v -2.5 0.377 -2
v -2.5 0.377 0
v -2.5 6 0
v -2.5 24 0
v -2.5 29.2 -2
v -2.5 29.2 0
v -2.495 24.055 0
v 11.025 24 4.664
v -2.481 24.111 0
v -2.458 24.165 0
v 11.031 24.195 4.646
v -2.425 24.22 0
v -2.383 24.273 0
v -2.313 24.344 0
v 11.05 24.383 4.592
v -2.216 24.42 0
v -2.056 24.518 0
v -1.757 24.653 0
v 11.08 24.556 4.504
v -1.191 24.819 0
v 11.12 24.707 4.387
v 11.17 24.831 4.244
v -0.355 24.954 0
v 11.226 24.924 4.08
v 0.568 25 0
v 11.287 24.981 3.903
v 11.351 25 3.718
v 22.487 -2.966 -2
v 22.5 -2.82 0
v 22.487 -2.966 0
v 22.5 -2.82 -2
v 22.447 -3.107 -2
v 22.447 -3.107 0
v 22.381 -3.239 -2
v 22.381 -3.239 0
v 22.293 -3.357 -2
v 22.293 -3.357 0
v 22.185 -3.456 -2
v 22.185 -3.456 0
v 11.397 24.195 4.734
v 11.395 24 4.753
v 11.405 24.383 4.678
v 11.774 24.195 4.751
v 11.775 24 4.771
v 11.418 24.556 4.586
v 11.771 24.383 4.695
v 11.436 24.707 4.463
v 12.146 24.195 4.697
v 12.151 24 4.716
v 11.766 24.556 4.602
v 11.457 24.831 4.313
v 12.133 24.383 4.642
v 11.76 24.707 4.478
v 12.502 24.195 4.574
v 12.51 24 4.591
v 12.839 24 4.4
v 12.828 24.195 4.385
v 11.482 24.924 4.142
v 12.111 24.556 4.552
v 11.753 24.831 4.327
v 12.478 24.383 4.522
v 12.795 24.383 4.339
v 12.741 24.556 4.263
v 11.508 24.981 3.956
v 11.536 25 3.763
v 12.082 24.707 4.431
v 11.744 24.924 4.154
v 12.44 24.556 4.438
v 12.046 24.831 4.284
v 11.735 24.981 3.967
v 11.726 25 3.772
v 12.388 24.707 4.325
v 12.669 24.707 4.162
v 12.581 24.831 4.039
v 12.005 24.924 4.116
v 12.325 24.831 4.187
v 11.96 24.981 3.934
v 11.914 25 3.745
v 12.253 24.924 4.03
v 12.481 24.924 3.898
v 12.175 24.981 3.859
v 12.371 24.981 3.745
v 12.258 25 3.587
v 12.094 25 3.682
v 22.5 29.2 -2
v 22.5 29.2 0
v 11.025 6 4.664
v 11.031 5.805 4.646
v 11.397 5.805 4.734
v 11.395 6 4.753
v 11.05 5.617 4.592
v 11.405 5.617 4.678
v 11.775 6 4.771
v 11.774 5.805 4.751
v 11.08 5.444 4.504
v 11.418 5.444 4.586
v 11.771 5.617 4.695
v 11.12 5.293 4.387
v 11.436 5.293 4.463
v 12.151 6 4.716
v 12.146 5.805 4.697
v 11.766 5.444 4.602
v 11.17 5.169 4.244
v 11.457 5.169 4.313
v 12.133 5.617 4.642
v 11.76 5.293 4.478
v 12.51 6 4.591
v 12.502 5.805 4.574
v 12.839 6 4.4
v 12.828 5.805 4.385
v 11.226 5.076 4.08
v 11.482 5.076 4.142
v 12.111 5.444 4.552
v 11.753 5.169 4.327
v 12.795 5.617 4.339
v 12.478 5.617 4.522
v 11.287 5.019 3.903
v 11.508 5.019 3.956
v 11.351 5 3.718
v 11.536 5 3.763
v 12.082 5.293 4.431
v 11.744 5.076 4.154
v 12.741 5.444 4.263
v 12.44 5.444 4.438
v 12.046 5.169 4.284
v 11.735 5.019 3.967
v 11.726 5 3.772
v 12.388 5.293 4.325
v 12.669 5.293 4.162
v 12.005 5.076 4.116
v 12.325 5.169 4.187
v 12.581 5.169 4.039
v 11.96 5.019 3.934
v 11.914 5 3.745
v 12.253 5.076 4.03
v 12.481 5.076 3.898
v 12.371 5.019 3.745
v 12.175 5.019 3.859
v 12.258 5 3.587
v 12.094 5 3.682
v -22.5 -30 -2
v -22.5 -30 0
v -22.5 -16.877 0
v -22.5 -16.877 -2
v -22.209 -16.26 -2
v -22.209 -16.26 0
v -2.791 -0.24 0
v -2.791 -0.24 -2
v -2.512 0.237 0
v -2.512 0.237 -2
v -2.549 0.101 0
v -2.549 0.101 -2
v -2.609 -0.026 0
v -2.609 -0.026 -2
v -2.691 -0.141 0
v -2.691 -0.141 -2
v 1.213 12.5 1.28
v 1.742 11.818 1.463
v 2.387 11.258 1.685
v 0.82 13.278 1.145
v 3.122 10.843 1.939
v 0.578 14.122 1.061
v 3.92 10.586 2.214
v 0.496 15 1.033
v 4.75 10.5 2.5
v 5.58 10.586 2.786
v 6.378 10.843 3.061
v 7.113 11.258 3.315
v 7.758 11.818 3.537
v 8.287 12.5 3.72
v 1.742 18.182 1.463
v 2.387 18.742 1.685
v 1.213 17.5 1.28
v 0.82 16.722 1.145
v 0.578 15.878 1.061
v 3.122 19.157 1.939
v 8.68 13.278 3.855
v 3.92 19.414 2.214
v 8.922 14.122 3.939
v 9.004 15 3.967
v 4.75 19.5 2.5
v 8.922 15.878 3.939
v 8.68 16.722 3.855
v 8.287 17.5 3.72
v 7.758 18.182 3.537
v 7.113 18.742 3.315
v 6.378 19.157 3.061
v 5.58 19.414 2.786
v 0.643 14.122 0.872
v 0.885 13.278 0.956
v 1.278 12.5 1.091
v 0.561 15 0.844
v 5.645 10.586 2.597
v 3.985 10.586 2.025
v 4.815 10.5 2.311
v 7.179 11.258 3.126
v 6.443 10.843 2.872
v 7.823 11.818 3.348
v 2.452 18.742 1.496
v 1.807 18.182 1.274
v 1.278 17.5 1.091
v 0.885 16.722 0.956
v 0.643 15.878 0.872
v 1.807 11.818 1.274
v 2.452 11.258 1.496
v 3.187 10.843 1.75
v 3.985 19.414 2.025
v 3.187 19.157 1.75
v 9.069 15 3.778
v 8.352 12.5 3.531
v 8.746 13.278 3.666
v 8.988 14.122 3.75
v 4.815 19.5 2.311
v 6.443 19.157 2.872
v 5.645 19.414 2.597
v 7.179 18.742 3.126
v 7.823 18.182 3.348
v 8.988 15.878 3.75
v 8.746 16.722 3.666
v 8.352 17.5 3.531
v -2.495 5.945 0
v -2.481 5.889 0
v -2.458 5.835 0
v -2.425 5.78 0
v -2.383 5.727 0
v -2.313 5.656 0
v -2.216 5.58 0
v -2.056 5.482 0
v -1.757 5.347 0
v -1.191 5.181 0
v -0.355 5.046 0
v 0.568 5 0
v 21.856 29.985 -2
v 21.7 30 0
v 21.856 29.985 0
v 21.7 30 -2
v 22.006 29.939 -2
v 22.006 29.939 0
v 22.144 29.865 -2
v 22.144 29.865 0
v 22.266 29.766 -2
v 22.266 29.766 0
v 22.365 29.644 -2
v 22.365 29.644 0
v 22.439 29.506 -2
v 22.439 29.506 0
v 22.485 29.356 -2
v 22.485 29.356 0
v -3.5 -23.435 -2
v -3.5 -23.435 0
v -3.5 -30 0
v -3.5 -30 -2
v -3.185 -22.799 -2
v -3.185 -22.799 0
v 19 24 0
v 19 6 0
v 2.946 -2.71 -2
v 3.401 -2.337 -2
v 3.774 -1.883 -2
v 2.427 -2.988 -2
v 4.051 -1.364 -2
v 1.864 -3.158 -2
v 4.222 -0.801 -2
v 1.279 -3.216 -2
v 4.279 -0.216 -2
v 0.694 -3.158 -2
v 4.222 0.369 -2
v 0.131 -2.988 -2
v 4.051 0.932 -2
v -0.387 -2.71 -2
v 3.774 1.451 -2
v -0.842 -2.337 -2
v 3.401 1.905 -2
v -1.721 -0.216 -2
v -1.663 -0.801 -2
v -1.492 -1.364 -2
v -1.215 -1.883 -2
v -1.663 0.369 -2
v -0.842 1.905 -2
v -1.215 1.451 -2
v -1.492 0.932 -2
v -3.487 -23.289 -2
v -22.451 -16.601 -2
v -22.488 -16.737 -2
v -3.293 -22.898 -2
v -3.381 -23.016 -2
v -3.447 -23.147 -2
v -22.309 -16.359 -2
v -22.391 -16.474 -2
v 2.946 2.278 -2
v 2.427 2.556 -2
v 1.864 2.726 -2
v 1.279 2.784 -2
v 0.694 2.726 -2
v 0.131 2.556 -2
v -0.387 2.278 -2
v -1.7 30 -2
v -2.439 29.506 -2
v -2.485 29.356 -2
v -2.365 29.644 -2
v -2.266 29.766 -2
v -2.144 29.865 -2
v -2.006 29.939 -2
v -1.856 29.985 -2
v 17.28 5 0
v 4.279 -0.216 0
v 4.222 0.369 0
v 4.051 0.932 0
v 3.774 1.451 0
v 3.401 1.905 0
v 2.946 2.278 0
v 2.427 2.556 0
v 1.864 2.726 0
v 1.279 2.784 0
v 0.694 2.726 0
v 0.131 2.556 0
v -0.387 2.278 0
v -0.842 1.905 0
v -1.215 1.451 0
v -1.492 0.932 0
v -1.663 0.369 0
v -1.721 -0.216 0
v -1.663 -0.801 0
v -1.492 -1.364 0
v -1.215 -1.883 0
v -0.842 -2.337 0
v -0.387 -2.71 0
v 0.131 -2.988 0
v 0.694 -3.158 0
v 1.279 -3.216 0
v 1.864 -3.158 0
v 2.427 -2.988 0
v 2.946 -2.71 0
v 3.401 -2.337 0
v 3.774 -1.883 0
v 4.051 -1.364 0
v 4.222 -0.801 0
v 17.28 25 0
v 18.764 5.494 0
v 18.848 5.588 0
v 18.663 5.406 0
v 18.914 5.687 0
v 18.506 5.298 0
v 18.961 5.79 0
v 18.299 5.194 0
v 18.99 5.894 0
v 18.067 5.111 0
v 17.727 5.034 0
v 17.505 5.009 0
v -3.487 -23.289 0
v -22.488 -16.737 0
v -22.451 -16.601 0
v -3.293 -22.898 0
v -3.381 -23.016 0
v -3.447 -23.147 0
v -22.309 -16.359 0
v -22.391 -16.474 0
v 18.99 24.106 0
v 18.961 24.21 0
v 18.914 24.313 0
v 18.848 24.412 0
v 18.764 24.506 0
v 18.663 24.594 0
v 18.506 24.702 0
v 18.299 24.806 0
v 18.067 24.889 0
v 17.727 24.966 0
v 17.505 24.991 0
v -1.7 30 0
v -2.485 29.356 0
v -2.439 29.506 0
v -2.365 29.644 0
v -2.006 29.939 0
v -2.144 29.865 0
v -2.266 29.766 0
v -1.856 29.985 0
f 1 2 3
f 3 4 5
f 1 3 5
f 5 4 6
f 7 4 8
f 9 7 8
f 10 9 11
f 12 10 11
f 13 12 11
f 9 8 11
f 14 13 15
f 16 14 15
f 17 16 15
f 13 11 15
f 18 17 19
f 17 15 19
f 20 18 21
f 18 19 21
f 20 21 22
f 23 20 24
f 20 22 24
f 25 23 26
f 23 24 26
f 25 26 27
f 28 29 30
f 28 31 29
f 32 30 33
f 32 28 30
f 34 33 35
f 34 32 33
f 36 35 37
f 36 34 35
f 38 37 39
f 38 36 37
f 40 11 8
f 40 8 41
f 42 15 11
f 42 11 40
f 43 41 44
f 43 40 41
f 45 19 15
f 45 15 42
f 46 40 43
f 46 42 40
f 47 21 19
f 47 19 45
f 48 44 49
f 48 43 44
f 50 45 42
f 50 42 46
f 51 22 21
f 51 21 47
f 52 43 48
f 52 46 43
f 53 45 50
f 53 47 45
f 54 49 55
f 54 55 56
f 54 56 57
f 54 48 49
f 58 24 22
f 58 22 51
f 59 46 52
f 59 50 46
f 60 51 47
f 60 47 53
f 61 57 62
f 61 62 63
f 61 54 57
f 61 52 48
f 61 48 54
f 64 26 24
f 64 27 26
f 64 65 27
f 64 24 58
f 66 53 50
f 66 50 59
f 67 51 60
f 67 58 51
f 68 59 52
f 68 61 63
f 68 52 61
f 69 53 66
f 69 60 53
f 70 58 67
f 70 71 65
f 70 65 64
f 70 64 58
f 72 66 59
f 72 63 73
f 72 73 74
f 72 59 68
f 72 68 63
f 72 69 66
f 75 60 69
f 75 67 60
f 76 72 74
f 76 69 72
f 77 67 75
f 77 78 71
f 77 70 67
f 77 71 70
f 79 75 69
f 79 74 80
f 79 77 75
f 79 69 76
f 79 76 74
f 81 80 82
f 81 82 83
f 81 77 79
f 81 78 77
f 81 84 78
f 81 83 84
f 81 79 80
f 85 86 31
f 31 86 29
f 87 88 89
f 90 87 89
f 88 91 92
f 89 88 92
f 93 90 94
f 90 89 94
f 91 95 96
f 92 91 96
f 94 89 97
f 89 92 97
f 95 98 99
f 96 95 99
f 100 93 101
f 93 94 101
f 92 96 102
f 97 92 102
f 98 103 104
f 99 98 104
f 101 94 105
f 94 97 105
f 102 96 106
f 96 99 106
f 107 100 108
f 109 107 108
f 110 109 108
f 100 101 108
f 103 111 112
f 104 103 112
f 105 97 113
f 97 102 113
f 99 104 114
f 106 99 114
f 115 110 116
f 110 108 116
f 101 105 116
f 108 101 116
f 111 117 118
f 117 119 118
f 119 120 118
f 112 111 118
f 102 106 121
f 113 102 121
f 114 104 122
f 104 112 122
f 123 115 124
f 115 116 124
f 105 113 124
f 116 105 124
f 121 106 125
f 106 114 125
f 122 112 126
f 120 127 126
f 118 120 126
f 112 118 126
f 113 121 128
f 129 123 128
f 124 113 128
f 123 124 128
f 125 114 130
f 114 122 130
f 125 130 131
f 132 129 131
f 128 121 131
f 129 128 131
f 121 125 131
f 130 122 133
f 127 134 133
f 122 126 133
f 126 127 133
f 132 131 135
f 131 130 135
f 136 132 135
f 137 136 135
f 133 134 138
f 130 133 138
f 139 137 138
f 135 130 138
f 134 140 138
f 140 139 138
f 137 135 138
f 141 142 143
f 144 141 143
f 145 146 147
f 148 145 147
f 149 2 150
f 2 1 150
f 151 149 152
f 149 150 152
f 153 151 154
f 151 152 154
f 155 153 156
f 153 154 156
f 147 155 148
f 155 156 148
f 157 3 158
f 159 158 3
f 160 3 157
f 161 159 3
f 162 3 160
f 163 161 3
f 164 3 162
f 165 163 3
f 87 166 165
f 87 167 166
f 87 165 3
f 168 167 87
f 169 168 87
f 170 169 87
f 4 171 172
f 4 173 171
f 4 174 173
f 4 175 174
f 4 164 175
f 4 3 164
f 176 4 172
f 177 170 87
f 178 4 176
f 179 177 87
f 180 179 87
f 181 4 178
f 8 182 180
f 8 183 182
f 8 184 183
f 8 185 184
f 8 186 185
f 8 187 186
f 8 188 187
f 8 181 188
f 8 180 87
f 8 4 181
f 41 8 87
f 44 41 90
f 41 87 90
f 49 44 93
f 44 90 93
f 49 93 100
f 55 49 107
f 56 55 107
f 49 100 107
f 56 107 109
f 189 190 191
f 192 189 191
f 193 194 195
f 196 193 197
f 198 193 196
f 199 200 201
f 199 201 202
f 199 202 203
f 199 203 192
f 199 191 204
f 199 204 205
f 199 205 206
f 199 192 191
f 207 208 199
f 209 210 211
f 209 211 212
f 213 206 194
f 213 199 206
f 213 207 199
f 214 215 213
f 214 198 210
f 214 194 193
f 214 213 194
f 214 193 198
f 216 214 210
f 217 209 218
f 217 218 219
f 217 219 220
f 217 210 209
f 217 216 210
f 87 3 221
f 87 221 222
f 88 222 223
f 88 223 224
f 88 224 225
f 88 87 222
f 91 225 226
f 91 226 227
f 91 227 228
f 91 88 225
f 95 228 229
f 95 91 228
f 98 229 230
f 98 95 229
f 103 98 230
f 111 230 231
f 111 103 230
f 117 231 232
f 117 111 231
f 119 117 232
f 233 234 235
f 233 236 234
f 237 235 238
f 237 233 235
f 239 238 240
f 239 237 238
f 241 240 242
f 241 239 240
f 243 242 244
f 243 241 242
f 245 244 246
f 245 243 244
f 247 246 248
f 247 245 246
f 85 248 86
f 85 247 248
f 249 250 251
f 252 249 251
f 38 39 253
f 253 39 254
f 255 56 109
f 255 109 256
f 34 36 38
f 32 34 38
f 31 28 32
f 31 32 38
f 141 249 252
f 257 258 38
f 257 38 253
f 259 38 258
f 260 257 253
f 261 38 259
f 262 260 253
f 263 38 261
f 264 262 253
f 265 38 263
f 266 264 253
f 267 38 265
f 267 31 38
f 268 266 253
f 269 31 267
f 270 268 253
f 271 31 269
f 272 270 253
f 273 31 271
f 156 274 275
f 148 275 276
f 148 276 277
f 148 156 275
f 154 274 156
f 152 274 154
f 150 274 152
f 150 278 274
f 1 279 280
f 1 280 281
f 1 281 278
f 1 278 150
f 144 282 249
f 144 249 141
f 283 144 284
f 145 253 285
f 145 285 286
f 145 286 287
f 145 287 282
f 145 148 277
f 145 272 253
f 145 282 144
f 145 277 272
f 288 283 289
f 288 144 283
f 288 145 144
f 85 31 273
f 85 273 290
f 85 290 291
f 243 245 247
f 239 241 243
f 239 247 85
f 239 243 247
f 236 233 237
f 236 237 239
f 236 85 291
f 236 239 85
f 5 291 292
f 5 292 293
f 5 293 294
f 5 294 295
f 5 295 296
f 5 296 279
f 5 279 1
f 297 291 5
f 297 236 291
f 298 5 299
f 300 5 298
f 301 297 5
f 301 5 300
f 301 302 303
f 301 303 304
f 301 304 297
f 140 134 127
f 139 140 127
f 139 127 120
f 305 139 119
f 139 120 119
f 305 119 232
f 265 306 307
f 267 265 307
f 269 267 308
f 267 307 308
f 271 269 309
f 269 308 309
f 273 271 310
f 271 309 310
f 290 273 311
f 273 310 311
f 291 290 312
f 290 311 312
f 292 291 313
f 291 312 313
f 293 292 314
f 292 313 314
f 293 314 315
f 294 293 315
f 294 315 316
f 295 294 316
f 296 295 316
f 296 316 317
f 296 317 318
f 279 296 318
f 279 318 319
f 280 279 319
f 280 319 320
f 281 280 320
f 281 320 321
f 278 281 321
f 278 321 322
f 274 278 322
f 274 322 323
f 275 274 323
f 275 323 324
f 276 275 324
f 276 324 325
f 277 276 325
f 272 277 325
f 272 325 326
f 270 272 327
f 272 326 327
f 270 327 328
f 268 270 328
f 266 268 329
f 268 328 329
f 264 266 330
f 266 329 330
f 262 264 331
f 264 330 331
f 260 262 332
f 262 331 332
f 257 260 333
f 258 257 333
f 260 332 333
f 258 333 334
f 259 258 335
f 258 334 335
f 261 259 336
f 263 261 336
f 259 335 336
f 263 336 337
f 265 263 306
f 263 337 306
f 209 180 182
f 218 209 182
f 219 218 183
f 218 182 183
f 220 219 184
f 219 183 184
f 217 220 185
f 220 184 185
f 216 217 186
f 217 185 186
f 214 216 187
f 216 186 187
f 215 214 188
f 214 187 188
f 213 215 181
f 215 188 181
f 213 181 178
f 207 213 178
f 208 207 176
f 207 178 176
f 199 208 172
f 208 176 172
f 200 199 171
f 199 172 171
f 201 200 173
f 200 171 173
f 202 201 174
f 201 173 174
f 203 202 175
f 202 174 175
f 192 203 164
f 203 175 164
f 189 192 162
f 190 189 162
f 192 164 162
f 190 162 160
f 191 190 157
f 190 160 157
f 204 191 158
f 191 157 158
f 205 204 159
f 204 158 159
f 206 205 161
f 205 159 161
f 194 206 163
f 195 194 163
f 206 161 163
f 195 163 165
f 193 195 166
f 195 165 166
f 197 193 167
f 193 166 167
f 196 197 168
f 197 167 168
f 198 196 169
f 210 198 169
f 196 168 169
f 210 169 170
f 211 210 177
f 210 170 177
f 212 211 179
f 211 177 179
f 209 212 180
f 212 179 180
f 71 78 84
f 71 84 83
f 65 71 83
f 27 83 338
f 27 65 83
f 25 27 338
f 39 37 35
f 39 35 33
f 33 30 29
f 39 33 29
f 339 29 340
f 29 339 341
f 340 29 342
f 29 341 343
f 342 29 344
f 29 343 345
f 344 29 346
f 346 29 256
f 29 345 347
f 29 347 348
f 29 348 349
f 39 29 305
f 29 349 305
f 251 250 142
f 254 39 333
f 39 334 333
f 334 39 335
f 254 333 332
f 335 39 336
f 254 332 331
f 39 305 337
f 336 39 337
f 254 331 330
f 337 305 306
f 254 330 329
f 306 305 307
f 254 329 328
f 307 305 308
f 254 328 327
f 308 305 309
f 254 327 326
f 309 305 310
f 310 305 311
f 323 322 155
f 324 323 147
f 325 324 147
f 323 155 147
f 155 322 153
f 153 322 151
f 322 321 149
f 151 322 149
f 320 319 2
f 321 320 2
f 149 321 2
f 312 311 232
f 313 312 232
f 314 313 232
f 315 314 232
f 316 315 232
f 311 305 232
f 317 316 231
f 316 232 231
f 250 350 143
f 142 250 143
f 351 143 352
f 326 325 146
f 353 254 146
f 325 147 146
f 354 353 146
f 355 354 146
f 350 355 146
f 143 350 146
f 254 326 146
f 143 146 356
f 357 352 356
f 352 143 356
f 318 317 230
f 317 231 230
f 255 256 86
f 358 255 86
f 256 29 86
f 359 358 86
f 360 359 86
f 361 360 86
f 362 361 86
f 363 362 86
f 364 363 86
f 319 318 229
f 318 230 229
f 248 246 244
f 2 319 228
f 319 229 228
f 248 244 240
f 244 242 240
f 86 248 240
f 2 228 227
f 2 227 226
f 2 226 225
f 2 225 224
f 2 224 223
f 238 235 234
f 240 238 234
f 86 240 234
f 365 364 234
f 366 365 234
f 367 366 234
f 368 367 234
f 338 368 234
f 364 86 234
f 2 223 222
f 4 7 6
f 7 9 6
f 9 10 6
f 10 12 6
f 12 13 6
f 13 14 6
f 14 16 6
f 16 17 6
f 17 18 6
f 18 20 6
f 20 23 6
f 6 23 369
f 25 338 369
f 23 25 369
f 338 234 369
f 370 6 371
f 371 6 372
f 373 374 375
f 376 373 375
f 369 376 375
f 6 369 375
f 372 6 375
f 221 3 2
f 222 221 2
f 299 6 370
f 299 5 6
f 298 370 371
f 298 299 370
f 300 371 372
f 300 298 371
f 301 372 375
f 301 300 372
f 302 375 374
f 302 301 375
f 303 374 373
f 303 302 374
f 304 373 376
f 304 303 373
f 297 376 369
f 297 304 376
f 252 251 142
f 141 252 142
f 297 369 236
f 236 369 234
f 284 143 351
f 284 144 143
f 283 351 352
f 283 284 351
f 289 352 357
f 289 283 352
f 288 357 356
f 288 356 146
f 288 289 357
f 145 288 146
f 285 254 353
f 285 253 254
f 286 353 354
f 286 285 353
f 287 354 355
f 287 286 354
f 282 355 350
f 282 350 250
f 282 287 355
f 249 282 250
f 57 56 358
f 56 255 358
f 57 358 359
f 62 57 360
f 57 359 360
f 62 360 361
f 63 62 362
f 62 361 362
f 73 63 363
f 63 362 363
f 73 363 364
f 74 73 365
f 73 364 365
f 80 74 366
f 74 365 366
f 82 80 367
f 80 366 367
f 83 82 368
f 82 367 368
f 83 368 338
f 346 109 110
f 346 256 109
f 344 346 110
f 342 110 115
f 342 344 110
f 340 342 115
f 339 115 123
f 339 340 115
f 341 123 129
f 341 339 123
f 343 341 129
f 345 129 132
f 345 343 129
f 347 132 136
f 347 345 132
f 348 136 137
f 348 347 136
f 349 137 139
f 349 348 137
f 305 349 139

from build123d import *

# Parameters (mm, degrees)
BOSS_EXTRUDE1_DEPTH = 2
BOSS_EXTRUDE3_DEPTH = 20
SKETCH7_R           = 4.5
CUT_EXTRUDE1_DEPTH  = 0.2
SKETCH8_R           = 3
CUT_EXTRUDE2_DEPTH  = 38.831864876
FILLET3_R           = 2
FILLET4_R           = 1
FILLET5_R           = 0.8


with BuildPart() as part:
    # Sketch1 → Boss-Extrude1 (new body)
    with BuildSketch(Plane.XY):
        Polygon((-2.5, 30), (22.5, 30), (22.5, -3.215927905), (-3.5, -23.03885463), (-3.5, -30), (-22.5, -30), (-22.5, -16.5), (-2.5, 0), align=None)
    extrude(amount=-BOSS_EXTRUDE1_DEPTH)

    # Sketch6 → Boss-Extrude3 (add)
    with BuildSketch(Plane(origin=(0, 25, 0), x_dir=(-1, 0, 0), z_dir=(0, 1, 0))):
        Polygon((2.5, 0), (-12, 5), (-19, 0), align=None)
    extrude(amount=-BOSS_EXTRUDE3_DEPTH)

    # Sketch7 → Cut-Extrude1 (cut)
    with BuildSketch(Plane(origin=(-0.265674814, 0, 0.770456961), x_dir=(0.9453729816262723, 0, 0.3259906833194039), z_dir=(-0.3259906833194039, 0, 0.9453729816262723))):
        with Locations((5.305498371, 15)):
            Circle(SKETCH7_R)
    extrude(amount=-CUT_EXTRUDE1_DEPTH, mode=Mode.SUBTRACT)

    # Sketch8 → Cut-Extrude2 (cut, through all)
    with BuildSketch(Plane.XY):
        with Locations((1.279211248, -0.215927905)):
            Circle(SKETCH8_R)
    extrude(amount=-CUT_EXTRUDE2_DEPTH, mode=Mode.SUBTRACT)

    # Fillet3
    fillet3_edges = [part.edges().sort_by_distance(p)[0] for p in [
        (12, 15, 5),
    ]]
    fillet(fillet3_edges, radius=FILLET3_R)

    # Fillet4
    fillet4_edges = [part.edges().sort_by_distance(p)[0] for p in [
        (11.964055432, 5, 4.752278398),
        (15.919669033, 5, 2.200236405),
        (4.262440156, 5, 2.331875916),
        (4.262440156, 25, 2.331875916),
        (11.964055432, 25, 4.752278398),
        (15.919669033, 25, 2.200236405),
    ]]
    fillet(fillet4_edges, radius=FILLET4_R)

    # Fillet5
    fillet5_edges = [part.edges().sort_by_distance(p)[0] for p in [
        (-2.5, 0, -1),
        (-22.5, -16.5, -1),
        (-3.5, -23.03885463, -1),
        (22.5, -3.215927905, -1),
        (-2.5, 30, -1),
        (22.5, 30, -1),
    ]]
    fillet(fillet5_edges, radius=FILLET5_R)


solid = part.part
